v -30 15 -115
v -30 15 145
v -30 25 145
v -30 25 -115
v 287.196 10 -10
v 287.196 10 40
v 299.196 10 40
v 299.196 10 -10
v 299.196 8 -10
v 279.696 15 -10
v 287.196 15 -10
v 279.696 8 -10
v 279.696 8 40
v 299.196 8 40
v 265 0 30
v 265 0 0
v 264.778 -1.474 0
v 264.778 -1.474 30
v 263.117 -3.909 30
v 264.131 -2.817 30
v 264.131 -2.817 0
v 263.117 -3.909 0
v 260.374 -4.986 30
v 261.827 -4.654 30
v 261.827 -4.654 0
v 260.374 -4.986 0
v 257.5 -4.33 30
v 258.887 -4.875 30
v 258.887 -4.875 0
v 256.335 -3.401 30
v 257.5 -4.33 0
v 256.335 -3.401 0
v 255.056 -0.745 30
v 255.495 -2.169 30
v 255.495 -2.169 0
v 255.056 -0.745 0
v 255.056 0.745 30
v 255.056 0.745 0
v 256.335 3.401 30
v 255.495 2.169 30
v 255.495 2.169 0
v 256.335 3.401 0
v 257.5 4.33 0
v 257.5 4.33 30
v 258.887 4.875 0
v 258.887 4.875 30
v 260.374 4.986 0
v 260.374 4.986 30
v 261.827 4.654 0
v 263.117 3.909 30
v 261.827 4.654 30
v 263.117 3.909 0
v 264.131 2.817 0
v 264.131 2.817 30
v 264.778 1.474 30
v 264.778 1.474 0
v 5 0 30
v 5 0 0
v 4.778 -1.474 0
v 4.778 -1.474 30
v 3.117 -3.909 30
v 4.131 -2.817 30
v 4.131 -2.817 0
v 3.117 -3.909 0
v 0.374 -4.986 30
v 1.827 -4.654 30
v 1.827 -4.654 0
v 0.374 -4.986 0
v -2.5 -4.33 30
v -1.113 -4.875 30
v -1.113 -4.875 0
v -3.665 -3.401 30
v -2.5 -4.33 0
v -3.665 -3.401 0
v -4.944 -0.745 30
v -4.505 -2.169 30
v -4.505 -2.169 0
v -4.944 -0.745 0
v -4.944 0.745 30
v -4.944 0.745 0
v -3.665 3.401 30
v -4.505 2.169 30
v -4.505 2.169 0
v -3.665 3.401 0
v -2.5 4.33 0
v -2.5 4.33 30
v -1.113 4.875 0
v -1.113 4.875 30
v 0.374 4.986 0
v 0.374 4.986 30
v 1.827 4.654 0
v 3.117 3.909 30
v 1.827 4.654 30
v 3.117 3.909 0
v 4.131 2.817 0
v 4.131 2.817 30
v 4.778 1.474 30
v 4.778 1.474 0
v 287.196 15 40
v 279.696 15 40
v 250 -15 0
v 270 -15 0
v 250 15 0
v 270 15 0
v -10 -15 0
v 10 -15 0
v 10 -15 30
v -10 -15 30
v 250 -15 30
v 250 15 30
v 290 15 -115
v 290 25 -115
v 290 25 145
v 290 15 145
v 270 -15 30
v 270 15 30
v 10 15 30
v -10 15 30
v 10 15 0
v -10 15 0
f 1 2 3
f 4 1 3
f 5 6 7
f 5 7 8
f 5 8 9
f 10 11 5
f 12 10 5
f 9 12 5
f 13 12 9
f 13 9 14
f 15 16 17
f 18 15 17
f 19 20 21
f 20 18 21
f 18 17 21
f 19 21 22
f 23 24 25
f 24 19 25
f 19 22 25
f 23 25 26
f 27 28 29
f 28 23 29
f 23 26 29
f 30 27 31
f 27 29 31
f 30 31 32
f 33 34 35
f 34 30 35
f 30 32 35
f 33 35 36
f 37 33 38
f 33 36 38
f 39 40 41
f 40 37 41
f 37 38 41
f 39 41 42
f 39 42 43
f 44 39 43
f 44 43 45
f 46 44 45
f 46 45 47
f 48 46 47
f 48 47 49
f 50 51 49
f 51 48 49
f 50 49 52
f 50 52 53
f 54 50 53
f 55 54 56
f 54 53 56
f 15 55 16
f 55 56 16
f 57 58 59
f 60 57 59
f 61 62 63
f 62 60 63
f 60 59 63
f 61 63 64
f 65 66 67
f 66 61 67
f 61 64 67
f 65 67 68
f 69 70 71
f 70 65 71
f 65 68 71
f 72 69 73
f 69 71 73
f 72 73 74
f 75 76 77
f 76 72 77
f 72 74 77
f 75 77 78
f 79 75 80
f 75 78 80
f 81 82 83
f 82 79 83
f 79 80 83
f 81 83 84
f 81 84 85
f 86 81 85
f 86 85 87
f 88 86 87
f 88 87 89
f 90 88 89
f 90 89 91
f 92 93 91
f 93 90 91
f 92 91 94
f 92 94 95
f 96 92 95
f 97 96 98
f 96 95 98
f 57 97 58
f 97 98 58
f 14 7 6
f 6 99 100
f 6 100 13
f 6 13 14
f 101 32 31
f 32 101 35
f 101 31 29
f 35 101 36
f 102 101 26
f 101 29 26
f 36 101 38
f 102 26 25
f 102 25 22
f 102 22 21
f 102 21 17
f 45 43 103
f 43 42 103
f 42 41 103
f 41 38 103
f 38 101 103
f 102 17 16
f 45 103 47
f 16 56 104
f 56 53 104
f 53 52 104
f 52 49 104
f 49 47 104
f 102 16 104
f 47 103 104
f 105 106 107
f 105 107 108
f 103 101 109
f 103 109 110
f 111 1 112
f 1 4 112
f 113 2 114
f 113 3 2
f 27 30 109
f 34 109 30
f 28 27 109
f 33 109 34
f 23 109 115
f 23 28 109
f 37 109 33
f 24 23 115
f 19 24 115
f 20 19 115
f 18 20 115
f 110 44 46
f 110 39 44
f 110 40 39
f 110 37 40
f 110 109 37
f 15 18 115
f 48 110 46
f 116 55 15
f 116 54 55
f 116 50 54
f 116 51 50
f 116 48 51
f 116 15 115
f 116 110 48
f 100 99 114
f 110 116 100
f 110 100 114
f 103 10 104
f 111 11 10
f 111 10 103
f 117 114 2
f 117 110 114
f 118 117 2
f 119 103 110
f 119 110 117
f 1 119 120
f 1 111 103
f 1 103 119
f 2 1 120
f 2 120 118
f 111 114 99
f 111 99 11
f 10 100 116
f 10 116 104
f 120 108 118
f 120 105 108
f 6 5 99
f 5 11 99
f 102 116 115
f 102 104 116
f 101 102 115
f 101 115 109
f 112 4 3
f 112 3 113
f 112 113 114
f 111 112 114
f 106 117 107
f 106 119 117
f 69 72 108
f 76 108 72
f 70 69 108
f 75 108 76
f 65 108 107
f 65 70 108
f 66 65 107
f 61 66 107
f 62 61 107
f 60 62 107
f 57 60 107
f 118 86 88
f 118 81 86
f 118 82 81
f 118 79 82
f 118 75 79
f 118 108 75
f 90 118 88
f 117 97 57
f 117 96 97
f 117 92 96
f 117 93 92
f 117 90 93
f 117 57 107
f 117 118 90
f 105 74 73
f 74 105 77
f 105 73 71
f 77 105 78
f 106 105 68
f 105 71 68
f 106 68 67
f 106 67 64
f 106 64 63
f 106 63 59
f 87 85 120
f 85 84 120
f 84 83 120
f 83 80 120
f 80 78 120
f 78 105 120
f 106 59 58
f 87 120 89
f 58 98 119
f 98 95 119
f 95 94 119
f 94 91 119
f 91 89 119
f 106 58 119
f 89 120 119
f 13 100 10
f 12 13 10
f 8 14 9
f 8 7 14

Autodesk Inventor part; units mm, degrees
ref_plane "YZ Plane" through (0, 0, 0) normal (1, 0, 0) x (0, 1, 0)
ref_plane "XZ Plane" through (0, 0, 0) normal (0, 1, 0) x (-1, 0, 0)
ref_plane "XY Plane" through (0, 0, 0) normal (0, 0, 1) x (1, 0, 0)
sketch "草图1" plane through (0, 0, 0) normal (0, 0, 1) x (1, 0, 0)
  circle A0 centre (0, 0) radius 5
  circle A1 centre (260, 0) radius 5
  line L0 (-10, 15) -> (10, 15)
  line L1 (10, 15) -> (10, -15)
  line L2 (10, -15) -> (-10, -15)
  line L3 (-10, -15) -> (-10, 15)
  line L4 (250, 15) -> (270, 15)
  line L5 (270, 15) -> (270, -15)
  line L6 (270, -15) -> (250, -15)
  line L7 (250, -15) -> (250, 15)
  line L8 (-30, 25) -> (290, 25)
  line L9 (290, 25) -> (290, 15)
  line L10 (290, 15) -> (-30, 15)
  line L11 (-30, 15) -> (-30, 25)
  dimension "d0" = 10
  dimension "d1" = 10
  dimension "d2" = 260
  dimension "d3" = 20
  dimension "d4" = 10
  dimension "d5" = 30
  dimension "d6" = 15
  dimension "d7" = 20
  dimension "d8" = 30
  dimension "d9" = 15
  dimension "d10" = 10
  dimension "d11" = 320
  dimension "d12" = 20
  dimension "d13" = 10
extrude "拉伸1" add sketch "草图1" along normal blind 30 contours A1 | L0 L1 L2 L3 | L4 L5 L6 L7
extrude "拉伸2" add sketch "草图1" along normal blind 145 and the other way blind 115 contours L10 L11 L8 L9 L4 L0
extrude "拉伸3" cut sketch "草图1" along normal blind 30 contours A1
sketch "草图2" plane through (-30, 15, 145) normal (0, -1, 0) x (1, 0, 0)
  line L0 (309.6956, -155) -> (317.1956, -155)
  line L1 (317.1956, -155) -> (317.1956, -105)
  line L2 (317.1956, -105) -> (309.6956, -105)
  line L3 (309.6956, -105) -> (309.6956, -155)
  line L4 (0, 0) -> (320, 0) projected
  point P0 (30, -145)
  dimension "d22" = 7.5
  dimension "d23" = 105
  dimension "d24" = 50
extrude "拉伸4" add sketch "草图2" along normal blind 7
sketch "草图3" plane through (287.1956, 15, 40) normal (1, 0, 0) x (0, 0, -1)
  line L0 (50, 0) -> (50, -7) projected
  line L1 (0, 0) -> (0, -7) projected
  line L2 (50, -7) -> (0, -7)
  line L3 (0, -7) -> (0, -5)
  line L4 (0, -5) -> (50, -5)
  line L5 (50, -5) -> (50, -7)
  point P0 (40, -15)
  dimension "d27" = 2
extrude "拉伸5" add sketch "草图3" along normal blind 12
properties part number "滑台"
